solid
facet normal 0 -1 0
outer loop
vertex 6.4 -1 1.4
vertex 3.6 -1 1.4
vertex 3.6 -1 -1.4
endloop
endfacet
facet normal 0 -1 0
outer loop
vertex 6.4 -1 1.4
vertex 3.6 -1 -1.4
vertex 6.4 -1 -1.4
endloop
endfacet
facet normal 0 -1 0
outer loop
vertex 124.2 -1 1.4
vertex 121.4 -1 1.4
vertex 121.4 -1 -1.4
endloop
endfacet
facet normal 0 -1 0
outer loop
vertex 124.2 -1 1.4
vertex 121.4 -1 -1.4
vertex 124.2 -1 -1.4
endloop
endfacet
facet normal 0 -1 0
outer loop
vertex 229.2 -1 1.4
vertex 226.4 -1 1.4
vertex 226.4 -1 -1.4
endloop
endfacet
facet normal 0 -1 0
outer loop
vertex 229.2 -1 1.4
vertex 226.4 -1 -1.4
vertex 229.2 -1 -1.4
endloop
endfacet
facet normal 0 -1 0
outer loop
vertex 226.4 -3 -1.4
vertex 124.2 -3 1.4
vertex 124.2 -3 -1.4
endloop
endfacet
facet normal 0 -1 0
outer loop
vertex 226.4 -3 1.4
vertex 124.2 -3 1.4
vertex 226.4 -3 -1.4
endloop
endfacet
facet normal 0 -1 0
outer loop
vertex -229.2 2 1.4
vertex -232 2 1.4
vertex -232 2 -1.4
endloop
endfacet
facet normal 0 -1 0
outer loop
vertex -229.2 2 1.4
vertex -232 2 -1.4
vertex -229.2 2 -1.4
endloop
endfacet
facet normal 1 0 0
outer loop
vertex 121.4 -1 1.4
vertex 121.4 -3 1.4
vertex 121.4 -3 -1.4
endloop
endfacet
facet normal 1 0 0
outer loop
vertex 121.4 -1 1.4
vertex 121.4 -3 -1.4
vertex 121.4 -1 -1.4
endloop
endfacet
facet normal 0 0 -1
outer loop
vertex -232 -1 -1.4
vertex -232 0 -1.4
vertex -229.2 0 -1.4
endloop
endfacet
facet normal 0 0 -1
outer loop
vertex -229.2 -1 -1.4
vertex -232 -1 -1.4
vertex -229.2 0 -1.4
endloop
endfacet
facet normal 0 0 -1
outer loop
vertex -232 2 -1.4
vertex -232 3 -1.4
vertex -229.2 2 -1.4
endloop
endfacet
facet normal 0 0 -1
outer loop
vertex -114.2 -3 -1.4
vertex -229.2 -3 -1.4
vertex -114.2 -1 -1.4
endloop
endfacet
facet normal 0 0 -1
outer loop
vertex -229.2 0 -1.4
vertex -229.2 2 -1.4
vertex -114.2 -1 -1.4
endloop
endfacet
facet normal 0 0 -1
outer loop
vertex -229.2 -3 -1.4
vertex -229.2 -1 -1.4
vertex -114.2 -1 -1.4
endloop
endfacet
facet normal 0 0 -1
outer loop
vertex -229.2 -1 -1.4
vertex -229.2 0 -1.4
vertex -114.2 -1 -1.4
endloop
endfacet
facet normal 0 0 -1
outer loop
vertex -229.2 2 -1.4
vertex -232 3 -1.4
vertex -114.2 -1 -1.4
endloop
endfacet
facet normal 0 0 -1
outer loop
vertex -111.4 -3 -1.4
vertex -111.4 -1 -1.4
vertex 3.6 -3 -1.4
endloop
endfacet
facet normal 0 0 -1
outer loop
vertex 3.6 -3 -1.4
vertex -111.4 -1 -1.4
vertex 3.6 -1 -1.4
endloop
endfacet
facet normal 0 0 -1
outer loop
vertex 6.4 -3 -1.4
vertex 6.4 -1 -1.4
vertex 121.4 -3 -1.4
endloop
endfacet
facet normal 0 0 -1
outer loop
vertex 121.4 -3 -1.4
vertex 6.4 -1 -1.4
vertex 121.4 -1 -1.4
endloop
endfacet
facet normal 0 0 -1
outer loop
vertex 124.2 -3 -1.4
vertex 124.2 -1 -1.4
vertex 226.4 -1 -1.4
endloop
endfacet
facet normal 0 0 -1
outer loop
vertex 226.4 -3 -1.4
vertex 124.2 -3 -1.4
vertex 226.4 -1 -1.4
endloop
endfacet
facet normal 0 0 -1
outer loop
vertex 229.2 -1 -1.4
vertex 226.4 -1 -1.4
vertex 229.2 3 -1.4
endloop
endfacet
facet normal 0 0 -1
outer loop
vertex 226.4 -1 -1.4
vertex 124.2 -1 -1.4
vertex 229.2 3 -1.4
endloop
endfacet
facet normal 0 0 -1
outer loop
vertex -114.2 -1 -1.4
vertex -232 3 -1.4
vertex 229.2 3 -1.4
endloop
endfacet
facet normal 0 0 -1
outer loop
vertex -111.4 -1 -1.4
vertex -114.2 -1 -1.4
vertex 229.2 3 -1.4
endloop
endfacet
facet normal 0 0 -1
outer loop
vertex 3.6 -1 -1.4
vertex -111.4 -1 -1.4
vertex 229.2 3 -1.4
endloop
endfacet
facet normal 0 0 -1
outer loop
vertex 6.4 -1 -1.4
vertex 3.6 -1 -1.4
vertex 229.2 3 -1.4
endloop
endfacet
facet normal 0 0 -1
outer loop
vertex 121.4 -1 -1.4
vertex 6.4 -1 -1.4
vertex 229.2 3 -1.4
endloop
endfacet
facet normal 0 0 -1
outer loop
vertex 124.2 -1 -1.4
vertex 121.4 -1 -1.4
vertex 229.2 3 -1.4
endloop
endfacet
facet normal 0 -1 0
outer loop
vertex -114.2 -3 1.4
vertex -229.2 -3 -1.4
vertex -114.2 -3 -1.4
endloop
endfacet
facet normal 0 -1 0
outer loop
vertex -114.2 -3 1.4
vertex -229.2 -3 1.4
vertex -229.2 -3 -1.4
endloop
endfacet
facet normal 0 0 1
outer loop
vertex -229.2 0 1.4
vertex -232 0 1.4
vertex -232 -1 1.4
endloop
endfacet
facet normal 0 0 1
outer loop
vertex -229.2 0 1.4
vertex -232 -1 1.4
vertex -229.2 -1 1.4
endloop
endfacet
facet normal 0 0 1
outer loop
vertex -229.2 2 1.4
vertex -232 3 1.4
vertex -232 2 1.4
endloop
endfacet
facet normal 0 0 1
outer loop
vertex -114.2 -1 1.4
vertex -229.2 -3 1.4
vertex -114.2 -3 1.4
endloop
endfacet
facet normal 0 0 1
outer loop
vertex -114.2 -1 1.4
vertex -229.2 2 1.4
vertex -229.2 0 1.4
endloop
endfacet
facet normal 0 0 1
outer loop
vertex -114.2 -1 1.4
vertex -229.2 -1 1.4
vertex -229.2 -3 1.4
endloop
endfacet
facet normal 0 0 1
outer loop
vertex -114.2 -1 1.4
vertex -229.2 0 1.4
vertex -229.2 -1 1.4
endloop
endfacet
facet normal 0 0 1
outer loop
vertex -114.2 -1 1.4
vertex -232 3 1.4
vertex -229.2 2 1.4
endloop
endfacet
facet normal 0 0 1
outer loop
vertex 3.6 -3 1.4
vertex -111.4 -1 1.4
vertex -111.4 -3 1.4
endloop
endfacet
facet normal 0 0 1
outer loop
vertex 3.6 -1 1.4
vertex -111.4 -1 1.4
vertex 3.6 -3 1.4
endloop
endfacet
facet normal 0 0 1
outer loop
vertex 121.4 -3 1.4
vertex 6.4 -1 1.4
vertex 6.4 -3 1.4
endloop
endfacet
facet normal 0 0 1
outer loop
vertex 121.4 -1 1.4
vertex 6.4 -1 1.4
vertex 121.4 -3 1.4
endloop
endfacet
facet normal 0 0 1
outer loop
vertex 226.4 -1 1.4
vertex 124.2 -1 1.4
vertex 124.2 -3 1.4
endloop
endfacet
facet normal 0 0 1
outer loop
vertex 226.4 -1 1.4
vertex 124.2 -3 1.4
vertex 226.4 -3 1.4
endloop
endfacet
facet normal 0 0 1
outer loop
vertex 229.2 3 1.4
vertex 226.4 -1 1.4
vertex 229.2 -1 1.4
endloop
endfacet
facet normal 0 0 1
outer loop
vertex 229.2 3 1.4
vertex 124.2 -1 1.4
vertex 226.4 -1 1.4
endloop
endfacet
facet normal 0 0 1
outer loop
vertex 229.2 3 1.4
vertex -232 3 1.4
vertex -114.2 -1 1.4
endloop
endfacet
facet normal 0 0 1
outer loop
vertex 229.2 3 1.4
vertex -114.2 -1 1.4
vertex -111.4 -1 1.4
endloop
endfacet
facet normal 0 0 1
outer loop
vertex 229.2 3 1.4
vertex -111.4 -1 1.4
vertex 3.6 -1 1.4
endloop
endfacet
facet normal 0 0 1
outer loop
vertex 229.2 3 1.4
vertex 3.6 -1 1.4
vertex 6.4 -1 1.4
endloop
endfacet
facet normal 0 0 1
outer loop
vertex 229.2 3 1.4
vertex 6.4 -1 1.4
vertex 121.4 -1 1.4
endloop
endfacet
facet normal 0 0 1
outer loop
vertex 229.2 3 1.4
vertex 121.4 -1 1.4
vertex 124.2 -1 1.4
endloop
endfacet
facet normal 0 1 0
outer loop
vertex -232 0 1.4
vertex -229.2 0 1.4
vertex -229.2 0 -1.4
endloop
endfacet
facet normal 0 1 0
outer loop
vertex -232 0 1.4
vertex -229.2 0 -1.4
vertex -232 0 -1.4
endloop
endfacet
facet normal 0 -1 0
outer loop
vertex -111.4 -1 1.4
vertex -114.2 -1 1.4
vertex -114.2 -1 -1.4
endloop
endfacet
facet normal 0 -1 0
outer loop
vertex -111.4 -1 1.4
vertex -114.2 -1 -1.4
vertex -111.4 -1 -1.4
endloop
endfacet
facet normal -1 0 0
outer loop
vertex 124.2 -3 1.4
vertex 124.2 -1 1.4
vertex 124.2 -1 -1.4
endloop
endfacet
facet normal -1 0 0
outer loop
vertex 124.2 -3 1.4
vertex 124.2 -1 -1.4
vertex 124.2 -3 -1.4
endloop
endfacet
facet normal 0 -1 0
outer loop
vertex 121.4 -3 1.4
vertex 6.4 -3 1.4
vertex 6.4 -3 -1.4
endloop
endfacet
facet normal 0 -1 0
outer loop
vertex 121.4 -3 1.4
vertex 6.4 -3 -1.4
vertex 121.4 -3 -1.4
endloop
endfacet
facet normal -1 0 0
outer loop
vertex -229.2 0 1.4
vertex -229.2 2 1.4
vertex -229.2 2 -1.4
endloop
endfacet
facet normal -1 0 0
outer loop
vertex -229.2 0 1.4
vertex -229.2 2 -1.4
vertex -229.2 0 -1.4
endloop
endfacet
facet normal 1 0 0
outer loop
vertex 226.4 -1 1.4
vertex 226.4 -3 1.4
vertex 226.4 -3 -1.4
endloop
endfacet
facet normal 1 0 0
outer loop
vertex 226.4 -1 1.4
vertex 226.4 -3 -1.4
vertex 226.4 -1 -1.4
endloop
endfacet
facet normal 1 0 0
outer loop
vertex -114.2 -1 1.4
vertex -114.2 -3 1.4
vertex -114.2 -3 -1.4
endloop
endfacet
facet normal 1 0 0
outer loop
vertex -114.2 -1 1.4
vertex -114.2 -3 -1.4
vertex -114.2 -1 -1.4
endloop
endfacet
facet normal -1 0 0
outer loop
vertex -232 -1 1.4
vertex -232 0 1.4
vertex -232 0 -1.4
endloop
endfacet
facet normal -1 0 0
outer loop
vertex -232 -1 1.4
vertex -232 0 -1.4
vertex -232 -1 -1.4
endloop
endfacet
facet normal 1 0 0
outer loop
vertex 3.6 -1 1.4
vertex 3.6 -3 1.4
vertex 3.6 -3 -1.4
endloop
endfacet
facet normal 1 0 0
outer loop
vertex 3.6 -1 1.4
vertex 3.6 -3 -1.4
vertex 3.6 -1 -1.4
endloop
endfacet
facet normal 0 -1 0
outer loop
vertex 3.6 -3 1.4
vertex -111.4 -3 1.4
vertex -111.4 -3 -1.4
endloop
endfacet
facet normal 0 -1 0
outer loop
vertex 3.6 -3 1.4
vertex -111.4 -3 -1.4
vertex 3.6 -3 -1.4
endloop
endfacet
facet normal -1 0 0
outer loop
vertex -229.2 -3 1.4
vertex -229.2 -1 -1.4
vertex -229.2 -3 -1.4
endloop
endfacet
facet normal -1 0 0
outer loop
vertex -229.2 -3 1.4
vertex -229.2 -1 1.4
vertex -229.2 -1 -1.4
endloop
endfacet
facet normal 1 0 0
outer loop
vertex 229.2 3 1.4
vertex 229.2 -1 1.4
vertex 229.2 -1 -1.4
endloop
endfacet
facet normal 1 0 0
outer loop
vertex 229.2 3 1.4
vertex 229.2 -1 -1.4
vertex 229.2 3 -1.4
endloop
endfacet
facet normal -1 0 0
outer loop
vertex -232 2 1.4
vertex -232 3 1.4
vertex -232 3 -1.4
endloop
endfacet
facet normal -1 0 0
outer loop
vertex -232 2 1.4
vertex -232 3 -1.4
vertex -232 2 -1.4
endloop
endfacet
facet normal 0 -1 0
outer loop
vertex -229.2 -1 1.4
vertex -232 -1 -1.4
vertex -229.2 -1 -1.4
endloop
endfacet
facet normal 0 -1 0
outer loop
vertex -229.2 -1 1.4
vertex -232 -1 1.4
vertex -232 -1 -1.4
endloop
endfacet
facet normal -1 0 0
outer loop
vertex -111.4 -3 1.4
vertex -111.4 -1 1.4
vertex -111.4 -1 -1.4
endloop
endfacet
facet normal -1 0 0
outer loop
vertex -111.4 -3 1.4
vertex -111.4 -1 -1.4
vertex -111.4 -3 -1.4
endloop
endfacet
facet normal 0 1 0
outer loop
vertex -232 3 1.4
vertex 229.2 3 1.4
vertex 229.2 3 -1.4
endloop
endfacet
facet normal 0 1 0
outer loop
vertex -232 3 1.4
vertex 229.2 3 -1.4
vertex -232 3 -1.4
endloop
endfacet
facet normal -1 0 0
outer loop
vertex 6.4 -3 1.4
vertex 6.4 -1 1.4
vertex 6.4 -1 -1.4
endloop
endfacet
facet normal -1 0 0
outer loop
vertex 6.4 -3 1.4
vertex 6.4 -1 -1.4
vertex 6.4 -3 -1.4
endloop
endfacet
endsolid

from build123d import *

# Parameters (mm, degrees)
EXTRUDE_1_DEPTH = 1.4


with BuildPart() as part:
    # Эскиз2 → Бобышка-Вытянуть1 (new, symmetric)
    with BuildSketch(Plane.XY):
        Polygon((-229.2, -3), (-114.2, -3), (-114.2, -1), (-111.4, -1), (-111.4, -3), (3.6, -3), (3.6, -1), (6.4, -1), (6.4, -3), (121.4, -3), (121.4, -1), (124.2, -1), (124.2, -3), (226.4, -3), (226.4, -1), (229.2, -1), (229.2, 3), (-229.2, 3), (-232, 3), (-232, 2), (-229.2, 2), (-229.2, 0), (-232, 0), (-232, -1), (-229.2, -1), align=None)
    extrude(amount=EXTRUDE_1_DEPTH, both=True)


solid = part.part
